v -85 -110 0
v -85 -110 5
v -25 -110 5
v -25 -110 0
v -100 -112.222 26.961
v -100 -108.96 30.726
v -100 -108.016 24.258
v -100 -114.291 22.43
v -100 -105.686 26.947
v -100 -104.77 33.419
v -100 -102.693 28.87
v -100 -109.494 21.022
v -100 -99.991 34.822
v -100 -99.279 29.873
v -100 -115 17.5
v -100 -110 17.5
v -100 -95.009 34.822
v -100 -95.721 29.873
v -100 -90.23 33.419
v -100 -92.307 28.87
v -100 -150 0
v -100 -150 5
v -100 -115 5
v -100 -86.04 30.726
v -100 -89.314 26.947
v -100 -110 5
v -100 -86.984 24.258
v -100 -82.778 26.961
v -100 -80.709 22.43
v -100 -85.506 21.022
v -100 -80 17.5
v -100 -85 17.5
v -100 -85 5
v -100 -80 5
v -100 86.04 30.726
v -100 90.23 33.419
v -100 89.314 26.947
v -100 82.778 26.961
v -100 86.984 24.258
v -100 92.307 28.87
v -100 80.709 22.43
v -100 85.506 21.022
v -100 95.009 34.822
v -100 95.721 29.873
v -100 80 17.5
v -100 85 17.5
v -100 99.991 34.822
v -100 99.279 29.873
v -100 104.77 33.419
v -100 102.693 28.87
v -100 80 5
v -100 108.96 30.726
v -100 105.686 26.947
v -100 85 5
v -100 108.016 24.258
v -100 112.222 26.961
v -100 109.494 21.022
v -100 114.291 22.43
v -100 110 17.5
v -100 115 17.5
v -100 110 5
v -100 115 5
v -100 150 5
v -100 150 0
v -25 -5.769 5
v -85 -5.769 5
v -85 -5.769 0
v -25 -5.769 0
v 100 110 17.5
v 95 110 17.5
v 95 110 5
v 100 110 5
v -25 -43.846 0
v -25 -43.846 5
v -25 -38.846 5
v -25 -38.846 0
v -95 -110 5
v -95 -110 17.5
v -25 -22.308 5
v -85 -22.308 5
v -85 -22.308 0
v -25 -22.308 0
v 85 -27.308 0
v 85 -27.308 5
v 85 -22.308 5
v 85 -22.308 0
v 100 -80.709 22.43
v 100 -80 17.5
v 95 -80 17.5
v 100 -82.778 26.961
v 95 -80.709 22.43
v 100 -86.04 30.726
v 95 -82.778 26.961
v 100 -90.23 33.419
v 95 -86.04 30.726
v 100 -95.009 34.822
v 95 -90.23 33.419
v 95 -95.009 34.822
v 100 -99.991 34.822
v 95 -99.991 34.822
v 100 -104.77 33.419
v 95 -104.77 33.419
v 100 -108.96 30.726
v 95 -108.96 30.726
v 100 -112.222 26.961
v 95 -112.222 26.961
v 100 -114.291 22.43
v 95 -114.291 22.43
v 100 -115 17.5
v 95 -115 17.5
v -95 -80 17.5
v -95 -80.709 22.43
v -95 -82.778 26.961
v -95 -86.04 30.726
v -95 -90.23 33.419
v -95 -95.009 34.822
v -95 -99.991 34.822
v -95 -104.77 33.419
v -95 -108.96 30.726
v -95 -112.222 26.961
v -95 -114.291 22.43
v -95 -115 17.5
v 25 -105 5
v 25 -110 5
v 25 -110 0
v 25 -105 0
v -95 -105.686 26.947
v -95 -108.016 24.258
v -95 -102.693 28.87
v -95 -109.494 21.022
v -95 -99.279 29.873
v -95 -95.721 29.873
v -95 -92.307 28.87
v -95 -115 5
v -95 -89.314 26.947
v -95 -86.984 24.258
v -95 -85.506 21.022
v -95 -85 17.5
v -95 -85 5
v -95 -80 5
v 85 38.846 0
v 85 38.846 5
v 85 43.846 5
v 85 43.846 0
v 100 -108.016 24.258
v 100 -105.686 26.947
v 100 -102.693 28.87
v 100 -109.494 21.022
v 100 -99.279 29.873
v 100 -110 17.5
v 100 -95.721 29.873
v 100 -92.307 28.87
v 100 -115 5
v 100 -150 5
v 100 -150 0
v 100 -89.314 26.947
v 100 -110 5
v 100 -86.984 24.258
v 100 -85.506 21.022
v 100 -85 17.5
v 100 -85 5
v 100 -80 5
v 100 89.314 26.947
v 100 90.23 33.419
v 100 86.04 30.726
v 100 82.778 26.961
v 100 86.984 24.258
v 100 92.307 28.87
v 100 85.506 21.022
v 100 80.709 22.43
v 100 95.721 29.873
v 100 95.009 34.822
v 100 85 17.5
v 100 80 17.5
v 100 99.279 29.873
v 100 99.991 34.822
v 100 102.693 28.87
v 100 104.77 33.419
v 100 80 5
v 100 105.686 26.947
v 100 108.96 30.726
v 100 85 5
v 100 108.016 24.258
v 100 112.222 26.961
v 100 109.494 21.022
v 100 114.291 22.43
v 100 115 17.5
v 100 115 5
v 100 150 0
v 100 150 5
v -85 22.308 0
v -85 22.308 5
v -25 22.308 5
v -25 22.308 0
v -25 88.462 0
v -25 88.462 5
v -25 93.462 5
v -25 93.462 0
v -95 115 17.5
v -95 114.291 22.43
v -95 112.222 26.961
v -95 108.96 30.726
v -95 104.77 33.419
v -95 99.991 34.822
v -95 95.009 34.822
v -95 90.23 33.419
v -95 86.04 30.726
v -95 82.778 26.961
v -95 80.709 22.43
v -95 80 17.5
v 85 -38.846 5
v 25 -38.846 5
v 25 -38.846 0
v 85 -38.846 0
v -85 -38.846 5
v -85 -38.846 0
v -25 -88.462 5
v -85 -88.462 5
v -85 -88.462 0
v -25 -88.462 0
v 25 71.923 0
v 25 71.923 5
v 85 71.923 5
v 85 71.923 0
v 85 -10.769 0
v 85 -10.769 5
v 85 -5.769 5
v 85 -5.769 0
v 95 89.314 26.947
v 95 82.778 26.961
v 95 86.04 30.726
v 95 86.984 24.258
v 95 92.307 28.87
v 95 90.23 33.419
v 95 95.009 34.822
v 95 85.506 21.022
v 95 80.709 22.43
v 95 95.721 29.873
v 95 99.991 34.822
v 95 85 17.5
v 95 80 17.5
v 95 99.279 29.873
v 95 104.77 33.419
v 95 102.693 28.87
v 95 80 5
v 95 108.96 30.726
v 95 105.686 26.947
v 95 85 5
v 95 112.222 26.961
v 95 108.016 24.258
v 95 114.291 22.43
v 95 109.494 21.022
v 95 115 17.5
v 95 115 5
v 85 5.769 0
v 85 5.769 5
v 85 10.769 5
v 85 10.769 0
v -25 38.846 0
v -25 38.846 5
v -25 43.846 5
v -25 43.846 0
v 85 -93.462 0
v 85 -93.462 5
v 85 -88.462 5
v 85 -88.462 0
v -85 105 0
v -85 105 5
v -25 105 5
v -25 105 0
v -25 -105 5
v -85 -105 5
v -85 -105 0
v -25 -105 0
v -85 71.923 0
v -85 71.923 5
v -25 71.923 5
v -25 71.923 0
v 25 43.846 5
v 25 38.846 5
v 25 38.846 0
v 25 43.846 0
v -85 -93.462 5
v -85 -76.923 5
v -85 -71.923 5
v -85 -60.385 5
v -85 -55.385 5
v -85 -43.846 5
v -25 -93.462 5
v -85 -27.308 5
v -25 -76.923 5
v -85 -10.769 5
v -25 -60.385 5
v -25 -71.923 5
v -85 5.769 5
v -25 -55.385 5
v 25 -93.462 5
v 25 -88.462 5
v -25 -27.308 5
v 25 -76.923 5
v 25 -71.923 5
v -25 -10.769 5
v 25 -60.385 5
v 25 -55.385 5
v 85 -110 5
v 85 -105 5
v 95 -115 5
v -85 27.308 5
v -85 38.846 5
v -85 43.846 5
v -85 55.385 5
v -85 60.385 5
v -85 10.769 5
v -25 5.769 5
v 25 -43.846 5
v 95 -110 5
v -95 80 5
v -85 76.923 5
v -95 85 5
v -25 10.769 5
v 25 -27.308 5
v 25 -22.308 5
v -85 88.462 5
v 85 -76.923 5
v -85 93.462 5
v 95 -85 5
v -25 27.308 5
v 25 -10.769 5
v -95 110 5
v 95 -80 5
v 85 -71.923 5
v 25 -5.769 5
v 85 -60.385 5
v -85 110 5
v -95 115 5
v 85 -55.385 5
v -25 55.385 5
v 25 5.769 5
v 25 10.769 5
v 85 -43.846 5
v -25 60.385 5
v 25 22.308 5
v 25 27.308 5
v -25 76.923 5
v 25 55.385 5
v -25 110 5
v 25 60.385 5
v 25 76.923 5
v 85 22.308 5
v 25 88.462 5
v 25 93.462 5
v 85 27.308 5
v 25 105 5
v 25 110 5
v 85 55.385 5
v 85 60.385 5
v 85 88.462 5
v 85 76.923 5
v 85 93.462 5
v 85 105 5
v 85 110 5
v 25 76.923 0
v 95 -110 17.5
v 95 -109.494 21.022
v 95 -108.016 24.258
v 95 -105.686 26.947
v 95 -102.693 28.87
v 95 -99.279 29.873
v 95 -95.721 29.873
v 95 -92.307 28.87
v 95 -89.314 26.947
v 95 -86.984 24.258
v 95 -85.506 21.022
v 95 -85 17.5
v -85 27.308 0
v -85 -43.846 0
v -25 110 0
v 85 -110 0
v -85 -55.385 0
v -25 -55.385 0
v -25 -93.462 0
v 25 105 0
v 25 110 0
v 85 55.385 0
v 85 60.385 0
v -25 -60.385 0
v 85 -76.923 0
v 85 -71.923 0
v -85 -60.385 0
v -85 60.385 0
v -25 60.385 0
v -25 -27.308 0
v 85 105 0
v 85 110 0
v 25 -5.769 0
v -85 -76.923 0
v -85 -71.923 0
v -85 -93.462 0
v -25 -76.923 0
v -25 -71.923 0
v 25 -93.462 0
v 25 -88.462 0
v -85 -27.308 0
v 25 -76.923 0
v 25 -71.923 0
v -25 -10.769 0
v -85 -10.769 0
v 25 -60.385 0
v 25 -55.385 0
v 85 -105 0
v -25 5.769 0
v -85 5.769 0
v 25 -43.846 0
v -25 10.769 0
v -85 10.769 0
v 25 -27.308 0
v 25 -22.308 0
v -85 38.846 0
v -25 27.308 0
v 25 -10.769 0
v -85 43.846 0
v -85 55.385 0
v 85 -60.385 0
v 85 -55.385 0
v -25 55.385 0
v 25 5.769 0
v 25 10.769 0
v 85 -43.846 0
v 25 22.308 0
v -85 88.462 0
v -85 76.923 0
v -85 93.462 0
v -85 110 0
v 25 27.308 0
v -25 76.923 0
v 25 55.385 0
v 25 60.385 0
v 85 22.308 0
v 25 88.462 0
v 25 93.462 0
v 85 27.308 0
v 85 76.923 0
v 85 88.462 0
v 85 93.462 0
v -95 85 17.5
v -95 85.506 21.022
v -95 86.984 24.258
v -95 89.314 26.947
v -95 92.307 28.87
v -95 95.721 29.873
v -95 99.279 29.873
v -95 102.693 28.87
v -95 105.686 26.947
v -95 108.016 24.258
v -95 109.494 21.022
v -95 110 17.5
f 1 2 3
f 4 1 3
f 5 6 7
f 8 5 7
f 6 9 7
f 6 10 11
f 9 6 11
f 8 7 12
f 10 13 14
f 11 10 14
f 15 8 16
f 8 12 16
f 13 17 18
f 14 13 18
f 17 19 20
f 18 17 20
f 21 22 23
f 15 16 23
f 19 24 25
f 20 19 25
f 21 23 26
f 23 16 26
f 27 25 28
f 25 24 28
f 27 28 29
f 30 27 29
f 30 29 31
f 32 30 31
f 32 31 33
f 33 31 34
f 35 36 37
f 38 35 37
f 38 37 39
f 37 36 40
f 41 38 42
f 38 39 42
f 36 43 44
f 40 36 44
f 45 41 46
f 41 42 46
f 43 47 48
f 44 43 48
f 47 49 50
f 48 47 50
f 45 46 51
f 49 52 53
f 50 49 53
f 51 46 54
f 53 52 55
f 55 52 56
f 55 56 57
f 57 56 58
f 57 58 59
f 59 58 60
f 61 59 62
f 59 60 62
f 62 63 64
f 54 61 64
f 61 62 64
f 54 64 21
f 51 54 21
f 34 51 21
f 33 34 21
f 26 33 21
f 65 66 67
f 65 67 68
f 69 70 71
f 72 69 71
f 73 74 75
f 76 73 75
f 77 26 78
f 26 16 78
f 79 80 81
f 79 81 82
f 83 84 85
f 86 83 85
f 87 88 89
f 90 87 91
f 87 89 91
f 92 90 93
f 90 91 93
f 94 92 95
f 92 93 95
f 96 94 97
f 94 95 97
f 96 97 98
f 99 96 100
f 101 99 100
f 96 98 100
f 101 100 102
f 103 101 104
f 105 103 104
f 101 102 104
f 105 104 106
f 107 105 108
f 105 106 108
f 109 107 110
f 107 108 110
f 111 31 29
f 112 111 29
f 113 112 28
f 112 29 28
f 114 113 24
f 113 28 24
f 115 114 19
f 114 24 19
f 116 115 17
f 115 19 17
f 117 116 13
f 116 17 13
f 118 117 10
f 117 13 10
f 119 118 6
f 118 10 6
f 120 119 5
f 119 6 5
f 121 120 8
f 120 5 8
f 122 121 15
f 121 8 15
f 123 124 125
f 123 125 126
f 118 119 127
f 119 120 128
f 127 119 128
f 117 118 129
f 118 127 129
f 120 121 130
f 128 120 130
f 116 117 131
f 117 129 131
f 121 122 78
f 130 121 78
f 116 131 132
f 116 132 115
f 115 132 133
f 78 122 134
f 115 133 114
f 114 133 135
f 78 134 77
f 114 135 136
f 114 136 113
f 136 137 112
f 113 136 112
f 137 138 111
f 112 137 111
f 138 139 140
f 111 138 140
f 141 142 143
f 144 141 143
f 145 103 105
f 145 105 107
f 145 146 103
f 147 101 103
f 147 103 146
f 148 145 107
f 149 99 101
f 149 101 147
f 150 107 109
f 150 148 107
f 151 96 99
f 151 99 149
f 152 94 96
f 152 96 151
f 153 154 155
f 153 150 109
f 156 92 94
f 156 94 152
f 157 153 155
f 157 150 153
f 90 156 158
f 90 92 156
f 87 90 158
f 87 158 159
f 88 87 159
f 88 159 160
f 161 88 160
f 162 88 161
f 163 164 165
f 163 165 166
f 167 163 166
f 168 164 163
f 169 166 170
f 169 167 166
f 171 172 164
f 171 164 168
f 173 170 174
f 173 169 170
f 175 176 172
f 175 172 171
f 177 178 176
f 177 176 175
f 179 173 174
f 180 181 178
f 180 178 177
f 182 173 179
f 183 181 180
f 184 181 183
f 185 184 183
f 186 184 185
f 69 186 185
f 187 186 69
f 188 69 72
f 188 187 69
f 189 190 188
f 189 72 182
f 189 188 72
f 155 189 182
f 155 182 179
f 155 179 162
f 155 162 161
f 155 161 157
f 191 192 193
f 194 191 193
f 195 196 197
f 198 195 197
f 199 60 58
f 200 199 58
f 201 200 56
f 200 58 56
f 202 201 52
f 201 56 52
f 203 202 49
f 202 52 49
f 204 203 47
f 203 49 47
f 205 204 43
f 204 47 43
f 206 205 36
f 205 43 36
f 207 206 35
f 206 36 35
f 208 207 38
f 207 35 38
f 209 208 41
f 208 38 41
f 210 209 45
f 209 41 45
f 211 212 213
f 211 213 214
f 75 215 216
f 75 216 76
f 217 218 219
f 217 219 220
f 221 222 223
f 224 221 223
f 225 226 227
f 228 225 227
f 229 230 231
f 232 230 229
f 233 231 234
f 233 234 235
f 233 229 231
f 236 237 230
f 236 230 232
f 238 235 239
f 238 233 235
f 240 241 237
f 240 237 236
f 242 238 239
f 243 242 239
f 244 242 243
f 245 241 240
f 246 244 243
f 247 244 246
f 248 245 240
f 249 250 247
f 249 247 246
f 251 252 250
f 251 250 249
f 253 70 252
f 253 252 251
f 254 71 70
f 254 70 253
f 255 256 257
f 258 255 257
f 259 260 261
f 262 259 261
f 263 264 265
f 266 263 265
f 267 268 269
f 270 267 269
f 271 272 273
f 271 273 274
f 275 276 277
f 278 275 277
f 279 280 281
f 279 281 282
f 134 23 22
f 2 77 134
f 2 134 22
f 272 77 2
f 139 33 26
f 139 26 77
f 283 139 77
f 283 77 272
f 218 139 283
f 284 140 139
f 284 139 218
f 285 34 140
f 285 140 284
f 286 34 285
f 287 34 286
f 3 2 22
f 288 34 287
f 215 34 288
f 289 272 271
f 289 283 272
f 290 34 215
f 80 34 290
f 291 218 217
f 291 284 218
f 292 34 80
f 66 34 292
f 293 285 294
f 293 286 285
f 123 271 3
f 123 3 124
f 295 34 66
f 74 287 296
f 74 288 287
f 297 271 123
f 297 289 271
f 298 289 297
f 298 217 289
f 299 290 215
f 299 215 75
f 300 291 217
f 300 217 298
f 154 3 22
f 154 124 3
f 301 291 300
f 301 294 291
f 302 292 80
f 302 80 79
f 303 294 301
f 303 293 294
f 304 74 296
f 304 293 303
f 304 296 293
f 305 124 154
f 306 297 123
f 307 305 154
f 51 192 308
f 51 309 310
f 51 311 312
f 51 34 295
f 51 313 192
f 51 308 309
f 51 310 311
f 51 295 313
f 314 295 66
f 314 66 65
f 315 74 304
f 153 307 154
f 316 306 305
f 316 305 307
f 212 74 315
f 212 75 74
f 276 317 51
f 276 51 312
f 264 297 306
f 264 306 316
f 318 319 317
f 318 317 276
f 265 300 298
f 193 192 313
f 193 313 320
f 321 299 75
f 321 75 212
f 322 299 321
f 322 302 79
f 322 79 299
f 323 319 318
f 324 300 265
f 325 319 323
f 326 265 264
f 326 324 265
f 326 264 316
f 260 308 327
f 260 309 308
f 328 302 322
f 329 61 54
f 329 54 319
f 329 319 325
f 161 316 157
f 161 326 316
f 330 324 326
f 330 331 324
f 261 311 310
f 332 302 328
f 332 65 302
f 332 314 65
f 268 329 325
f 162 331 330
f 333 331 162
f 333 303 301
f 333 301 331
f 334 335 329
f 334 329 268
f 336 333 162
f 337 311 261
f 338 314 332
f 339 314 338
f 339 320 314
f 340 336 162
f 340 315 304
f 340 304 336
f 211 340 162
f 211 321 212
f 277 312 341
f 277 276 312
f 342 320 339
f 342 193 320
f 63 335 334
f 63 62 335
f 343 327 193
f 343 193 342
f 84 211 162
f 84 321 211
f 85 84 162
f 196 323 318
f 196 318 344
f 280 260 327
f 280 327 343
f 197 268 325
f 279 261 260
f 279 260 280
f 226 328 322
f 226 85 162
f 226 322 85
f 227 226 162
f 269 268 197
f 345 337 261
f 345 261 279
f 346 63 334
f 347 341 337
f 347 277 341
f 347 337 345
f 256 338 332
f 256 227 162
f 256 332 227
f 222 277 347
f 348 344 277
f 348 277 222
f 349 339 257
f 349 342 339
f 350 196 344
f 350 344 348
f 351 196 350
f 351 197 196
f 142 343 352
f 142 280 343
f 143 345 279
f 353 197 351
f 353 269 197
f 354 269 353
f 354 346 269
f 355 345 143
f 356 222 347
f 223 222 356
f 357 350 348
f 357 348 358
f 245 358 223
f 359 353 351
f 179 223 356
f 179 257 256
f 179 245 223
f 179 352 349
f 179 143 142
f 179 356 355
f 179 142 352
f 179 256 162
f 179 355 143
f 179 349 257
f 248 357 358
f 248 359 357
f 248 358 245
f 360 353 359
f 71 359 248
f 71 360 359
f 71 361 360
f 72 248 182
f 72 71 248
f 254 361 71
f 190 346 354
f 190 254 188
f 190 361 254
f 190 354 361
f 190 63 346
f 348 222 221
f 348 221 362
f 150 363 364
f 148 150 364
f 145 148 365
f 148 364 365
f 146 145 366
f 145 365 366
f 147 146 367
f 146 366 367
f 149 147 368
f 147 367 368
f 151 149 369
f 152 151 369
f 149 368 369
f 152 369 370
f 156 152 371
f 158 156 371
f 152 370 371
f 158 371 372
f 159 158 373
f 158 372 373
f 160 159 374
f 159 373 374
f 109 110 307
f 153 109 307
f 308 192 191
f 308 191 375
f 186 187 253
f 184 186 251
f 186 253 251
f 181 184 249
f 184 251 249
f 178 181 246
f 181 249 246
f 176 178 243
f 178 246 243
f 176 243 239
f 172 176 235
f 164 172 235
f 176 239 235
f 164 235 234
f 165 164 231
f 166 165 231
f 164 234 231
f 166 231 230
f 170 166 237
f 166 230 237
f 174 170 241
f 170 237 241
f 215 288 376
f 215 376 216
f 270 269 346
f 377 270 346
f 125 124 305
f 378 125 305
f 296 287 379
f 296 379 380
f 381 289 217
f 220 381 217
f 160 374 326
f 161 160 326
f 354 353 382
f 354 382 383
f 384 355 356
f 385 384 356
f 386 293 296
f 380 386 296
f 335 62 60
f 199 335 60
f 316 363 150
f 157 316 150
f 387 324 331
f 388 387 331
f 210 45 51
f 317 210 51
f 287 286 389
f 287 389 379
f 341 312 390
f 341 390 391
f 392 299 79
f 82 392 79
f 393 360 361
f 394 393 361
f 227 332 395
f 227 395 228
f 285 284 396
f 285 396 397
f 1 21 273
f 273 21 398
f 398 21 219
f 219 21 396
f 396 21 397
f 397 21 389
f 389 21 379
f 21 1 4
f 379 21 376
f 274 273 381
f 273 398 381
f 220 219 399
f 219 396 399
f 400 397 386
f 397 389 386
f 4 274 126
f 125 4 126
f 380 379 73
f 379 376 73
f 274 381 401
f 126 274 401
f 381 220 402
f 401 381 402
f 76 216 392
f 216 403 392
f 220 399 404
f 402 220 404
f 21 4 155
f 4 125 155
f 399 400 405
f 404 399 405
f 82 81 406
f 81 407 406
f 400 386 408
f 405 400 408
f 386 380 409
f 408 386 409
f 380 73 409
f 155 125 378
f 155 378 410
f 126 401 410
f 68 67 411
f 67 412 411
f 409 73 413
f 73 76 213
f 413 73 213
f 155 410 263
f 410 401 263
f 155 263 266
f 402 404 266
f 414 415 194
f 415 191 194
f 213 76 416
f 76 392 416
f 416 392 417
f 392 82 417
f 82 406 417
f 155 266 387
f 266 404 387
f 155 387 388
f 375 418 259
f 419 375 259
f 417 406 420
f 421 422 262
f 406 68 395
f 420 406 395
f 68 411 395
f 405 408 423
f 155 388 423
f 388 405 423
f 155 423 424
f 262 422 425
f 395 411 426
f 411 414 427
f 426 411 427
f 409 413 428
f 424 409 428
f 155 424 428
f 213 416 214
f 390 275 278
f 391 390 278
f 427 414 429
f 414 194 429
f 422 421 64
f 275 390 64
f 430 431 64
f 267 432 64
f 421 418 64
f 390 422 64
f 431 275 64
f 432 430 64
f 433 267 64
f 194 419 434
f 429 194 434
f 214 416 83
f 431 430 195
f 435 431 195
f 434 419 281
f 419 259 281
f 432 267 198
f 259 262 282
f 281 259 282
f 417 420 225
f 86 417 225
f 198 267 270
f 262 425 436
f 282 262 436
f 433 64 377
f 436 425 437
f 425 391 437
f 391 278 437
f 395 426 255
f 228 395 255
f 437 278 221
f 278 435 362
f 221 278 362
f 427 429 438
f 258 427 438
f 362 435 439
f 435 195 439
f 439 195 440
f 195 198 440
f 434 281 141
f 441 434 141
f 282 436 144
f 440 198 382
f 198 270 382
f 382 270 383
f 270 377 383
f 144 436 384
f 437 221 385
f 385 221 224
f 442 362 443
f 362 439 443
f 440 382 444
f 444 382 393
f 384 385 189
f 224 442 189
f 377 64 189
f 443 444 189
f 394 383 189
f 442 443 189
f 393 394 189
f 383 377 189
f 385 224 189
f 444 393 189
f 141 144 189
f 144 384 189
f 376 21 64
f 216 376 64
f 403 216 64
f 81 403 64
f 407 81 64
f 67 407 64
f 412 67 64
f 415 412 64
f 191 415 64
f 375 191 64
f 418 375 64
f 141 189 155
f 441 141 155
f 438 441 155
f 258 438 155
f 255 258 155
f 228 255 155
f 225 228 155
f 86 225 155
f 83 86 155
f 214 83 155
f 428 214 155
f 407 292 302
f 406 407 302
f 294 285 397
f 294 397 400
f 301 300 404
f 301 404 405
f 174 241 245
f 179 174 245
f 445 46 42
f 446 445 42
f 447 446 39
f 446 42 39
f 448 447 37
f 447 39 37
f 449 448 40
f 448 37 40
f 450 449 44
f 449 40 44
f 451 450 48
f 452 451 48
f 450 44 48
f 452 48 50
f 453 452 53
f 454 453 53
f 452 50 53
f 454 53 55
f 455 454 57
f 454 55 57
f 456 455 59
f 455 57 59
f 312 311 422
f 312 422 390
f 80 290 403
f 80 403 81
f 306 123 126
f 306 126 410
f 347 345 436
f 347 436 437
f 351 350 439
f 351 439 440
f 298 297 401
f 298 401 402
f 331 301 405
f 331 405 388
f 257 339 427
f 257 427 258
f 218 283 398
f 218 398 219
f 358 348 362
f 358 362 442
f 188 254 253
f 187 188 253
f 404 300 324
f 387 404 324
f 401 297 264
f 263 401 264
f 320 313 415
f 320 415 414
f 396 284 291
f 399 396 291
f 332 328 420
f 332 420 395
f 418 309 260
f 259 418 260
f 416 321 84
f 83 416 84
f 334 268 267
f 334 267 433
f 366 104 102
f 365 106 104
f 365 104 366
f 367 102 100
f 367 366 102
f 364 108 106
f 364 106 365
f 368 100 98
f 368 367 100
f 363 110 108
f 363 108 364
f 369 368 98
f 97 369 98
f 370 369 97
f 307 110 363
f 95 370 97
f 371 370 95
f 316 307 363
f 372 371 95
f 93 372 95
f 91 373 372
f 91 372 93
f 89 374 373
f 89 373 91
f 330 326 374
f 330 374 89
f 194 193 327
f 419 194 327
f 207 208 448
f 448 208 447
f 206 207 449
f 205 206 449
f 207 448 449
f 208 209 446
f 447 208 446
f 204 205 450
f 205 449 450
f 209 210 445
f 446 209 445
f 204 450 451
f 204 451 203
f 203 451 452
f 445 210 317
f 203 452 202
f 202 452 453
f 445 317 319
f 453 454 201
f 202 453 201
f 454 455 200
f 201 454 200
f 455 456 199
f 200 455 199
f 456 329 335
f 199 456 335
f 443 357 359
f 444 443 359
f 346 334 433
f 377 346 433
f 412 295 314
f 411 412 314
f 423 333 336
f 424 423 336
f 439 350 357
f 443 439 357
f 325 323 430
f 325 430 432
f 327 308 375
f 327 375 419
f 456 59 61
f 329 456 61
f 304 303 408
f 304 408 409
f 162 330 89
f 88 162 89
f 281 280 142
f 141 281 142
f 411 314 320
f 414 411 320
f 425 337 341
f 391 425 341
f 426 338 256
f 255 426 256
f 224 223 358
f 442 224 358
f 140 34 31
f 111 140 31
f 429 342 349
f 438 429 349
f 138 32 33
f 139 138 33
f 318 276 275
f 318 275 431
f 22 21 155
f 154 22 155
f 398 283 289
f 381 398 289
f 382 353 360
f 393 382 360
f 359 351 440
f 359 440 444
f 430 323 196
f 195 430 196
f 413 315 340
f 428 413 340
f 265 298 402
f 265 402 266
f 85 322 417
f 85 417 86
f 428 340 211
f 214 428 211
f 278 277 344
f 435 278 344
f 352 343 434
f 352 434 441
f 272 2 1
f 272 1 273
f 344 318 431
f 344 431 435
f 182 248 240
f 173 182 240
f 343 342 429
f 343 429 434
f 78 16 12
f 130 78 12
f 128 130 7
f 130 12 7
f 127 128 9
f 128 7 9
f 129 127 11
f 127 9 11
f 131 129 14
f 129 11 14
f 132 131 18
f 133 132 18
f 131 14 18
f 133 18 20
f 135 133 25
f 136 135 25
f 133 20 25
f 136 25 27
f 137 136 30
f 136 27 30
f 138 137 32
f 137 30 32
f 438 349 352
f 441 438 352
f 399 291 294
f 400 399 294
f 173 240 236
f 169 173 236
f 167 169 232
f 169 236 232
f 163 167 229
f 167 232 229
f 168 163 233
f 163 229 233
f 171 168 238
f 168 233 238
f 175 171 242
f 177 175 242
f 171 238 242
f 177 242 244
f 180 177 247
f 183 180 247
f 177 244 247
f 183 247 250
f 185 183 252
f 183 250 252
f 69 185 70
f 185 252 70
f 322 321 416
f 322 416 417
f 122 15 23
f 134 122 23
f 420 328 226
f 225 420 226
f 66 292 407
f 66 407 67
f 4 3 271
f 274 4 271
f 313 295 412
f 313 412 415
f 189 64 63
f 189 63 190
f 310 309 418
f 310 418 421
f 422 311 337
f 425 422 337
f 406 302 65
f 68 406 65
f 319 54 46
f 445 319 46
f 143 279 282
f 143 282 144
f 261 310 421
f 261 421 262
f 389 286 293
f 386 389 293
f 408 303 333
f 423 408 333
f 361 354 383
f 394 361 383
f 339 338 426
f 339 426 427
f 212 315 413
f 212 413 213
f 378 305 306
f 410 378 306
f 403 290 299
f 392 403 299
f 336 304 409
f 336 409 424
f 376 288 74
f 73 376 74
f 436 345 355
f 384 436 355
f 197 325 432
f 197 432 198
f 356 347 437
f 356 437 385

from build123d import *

# Parameters (mm, degrees)
CROQUIS1_W              = 200
CROQUIS1_H              = 300
SALIENTE_EXTRUIR1_DEPTH = 5
CROQUIS2_W              = 60
CROQUIS2_H              = 5
CORTAR_EXTRUIR1_DEPTH   = 181.346887969
EXTRUIR_L_MINA1_DEPTH   = 200
CROQUIS7_W              = 190
CROQUIS7_H              = 272.300046581
CORTAR_EXTRUIR2_DEPTH   = 183.756668825


with BuildPart() as part:
    # Croquis1 → Saliente-Extruir1 (new body)
    with BuildSketch(Plane.XY):
        Rectangle(CROQUIS1_W, CROQUIS1_H)
    extrude(amount=SALIENTE_EXTRUIR1_DEPTH)

    # Croquis2 → Cortar-Extruir1 (cut, through all)
    with BuildSketch(Plane.XY.offset(5)):
        with Locations((-55, 107.5)):
            Rectangle(CROQUIS2_W, CROQUIS2_H)
        with Locations((55, 107.5)):
            Rectangle(CROQUIS2_W, CROQUIS2_H)
        with Locations((55, 90.961538462)):
            Rectangle(CROQUIS2_W, CROQUIS2_H)
        with Locations((55, 74.423076923)):
            Rectangle(CROQUIS2_W, CROQUIS2_H)
        with Locations((55, 57.884615385)):
            Rectangle(CROQUIS2_W, CROQUIS2_H)
        with Locations((55, 41.346153846)):
            Rectangle(CROQUIS2_W, CROQUIS2_H)
        with Locations((55, 24.807692308)):
            Rectangle(CROQUIS2_W, CROQUIS2_H)
        with Locations((55, 8.269230769)):
            Rectangle(CROQUIS2_W, CROQUIS2_H)
        with Locations((55, -8.269230769)):
            Rectangle(CROQUIS2_W, CROQUIS2_H)
        with Locations((55, -24.807692308)):
            Rectangle(CROQUIS2_W, CROQUIS2_H)
        with Locations((55, -41.346153846)):
            Rectangle(CROQUIS2_W, CROQUIS2_H)
        with Locations((55, -57.884615385)):
            Rectangle(CROQUIS2_W, CROQUIS2_H)
        with Locations((55, -74.423076923)):
            Rectangle(CROQUIS2_W, CROQUIS2_H)
        with Locations((55, -90.961538462)):
            Rectangle(CROQUIS2_W, CROQUIS2_H)
        with Locations((55, -107.5)):
            Rectangle(CROQUIS2_W, CROQUIS2_H)
        with Locations((-55, 90.961538462)):
            Rectangle(CROQUIS2_W, CROQUIS2_H)
        with Locations((-55, 74.423076923)):
            Rectangle(CROQUIS2_W, CROQUIS2_H)
        with Locations((-55, 57.884615385)):
            Rectangle(CROQUIS2_W, CROQUIS2_H)
        with Locations((-55, 41.346153846)):
            Rectangle(CROQUIS2_W, CROQUIS2_H)
        with Locations((-55, 24.807692308)):
            Rectangle(CROQUIS2_W, CROQUIS2_H)
        with Locations((-55, 8.269230769)):
            Rectangle(CROQUIS2_W, CROQUIS2_H)
        with Locations((-55, -8.269230769)):
            Rectangle(CROQUIS2_W, CROQUIS2_H)
        with Locations((-55, -24.807692308)):
            Rectangle(CROQUIS2_W, CROQUIS2_H)
        with Locations((-55, -41.346153846)):
            Rectangle(CROQUIS2_W, CROQUIS2_H)
        with Locations((-55, -57.884615385)):
            Rectangle(CROQUIS2_W, CROQUIS2_H)
        with Locations((-55, -74.423076923)):
            Rectangle(CROQUIS2_W, CROQUIS2_H)
        with Locations((-55, -90.961538462)):
            Rectangle(CROQUIS2_W, CROQUIS2_H)
        with Locations((-55, -107.5)):
            Rectangle(CROQUIS2_W, CROQUIS2_H)
    extrude(amount=-CORTAR_EXTRUIR1_DEPTH, mode=Mode.SUBTRACT)

    # Croquis5 → Extruir-Lámina1 (add)
    with BuildSketch(Plane.ZY.offset(100)):
        with BuildLine():
            Line((5, 85), (17.5, 85))
            ThreePointArc((17.5, 85), (30, 97.5), (17.5, 110))
            Line((17.5, 110), (5, 110))
            Line((5, 110), (5, 115))
            Line((5, 115), (17.5, 115))
            ThreePointArc((17.5, 115), (35, 97.5), (17.5, 80))
            Line((17.5, 80), (5, 80))
            Line((5, 80), (5, 85))
        make_face()
        with BuildLine():
            Line((5, -110), (17.5, -110))
            ThreePointArc((17.5, -110), (30, -97.5), (17.5, -85))
            Line((17.5, -85), (5, -85))
            Line((5, -85), (5, -80))
            Line((5, -80), (17.5, -80))
            ThreePointArc((17.5, -80), (35, -97.5), (17.5, -115))
            Line((17.5, -115), (5, -115))
            Line((5, -115), (5, -110))
        make_face()
    extrude(amount=-EXTRUIR_L_MINA1_DEPTH)

    # Croquis7 → Cortar-Extruir2 (cut, through all)
    with BuildSketch(Plane.XY.offset(5)):
        with Locations((0, 8.640872113)):
            Rectangle(CROQUIS7_W, CROQUIS7_H)
    extrude(amount=CORTAR_EXTRUIR2_DEPTH, mode=Mode.SUBTRACT)


solid = part.part
